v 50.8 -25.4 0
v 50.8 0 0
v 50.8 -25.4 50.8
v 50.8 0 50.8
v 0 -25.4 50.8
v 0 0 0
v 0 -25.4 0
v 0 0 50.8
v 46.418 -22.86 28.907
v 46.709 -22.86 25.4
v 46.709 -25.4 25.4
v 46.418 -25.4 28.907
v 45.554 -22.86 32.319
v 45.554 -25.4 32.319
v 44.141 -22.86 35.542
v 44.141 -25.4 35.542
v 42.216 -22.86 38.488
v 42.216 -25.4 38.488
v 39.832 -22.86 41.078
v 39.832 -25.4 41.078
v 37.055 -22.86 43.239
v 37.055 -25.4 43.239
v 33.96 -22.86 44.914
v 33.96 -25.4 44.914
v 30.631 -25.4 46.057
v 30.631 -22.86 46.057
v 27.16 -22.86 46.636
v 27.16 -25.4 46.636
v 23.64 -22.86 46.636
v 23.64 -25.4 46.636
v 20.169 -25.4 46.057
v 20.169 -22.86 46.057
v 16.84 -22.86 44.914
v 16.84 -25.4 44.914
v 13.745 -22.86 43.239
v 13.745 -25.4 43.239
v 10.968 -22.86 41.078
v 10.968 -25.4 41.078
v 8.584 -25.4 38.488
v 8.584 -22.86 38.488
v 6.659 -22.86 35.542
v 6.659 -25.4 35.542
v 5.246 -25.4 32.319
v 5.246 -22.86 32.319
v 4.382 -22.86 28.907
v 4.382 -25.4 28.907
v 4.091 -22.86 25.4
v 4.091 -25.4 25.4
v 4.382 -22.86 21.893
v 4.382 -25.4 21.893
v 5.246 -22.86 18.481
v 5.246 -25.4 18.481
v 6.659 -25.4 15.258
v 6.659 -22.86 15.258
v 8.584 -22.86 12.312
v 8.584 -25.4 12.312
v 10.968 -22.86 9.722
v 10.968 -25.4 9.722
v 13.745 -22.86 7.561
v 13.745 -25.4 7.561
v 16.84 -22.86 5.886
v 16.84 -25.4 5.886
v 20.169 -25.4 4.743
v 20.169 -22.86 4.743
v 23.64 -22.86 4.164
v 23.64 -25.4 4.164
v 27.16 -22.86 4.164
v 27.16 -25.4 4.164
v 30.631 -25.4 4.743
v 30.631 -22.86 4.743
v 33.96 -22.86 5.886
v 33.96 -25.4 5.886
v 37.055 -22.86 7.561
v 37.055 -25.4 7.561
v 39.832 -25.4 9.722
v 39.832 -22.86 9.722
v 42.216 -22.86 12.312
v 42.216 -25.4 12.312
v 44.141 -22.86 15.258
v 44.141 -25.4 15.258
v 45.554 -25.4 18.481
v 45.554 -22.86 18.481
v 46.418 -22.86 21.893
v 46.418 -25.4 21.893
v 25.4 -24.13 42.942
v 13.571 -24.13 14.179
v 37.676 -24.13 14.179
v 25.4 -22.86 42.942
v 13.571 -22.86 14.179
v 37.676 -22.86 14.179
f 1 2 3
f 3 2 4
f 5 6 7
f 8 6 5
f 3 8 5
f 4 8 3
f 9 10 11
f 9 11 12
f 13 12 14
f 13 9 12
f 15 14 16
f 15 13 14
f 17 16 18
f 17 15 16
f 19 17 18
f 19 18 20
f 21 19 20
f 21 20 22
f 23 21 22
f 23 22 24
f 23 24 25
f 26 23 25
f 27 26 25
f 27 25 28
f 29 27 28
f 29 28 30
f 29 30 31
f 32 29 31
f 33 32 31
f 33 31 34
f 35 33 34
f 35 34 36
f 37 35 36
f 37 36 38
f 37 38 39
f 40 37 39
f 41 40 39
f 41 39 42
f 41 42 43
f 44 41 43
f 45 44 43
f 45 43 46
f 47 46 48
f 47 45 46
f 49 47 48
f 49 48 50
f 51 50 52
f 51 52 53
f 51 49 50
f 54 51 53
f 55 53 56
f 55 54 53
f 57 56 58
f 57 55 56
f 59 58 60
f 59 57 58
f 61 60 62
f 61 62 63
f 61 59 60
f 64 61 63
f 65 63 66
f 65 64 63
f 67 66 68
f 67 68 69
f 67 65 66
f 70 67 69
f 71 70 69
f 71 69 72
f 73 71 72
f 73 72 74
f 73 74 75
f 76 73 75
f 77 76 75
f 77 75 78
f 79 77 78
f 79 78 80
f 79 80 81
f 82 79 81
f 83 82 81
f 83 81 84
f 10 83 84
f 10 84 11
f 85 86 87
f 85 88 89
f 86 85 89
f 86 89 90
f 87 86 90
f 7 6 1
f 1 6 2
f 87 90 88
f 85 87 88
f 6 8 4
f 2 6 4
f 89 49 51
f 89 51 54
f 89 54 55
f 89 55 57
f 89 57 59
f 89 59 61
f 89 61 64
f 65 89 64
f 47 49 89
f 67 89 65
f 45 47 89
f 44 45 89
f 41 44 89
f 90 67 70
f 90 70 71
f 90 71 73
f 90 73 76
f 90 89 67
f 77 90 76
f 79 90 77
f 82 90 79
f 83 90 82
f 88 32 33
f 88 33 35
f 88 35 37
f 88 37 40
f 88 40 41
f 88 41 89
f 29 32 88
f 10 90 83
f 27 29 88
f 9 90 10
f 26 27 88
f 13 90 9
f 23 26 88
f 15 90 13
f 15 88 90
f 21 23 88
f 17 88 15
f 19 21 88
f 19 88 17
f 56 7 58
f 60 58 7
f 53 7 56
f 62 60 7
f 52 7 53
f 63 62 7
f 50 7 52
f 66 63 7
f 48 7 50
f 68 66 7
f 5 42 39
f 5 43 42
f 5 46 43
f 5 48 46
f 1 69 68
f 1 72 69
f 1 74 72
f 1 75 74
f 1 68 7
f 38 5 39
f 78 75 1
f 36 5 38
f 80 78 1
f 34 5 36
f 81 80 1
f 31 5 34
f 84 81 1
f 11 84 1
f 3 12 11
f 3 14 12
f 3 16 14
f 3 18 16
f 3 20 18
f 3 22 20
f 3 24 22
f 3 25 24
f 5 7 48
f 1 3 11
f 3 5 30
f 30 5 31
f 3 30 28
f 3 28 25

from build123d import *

# Parameters (mm, degrees)
F0_W     = 50.8
F0_H     = 50.8
F0_R     = 21.309013
F1_DEPTH = 25.4
F2_DEPTH = 22.86
F3_DEPTH = 24.13


with BuildPart() as f1:
    # F0 (on Front) → F1 (new body)
    with BuildSketch(Plane.XZ):
        with Locations((25.4, 25.4)):
            Rectangle(F0_W, F0_H)
        with Locations((25.4, 25.4)):
            Circle(F0_R, mode=Mode.SUBTRACT)
    extrude(amount=F1_DEPTH)

    # F0 (on Front) → F2 (join)
    with BuildSketch(Plane.XZ):
        with Locations((25.4, 25.4)):
            Circle(F0_R)
        Polygon((13.571316, 14.178988), (25.4, 42.942073), (37.675597, 14.178988), align=None, mode=Mode.SUBTRACT)
    extrude(amount=F2_DEPTH)

    # F0 (on Front) → F3 (join)
    with BuildSketch(Plane.XZ):
        Polygon((37.675597, 14.178988), (25.4, 42.942073), (13.571316, 14.178988), align=None)
    extrude(amount=F3_DEPTH)


solid = f1.part
